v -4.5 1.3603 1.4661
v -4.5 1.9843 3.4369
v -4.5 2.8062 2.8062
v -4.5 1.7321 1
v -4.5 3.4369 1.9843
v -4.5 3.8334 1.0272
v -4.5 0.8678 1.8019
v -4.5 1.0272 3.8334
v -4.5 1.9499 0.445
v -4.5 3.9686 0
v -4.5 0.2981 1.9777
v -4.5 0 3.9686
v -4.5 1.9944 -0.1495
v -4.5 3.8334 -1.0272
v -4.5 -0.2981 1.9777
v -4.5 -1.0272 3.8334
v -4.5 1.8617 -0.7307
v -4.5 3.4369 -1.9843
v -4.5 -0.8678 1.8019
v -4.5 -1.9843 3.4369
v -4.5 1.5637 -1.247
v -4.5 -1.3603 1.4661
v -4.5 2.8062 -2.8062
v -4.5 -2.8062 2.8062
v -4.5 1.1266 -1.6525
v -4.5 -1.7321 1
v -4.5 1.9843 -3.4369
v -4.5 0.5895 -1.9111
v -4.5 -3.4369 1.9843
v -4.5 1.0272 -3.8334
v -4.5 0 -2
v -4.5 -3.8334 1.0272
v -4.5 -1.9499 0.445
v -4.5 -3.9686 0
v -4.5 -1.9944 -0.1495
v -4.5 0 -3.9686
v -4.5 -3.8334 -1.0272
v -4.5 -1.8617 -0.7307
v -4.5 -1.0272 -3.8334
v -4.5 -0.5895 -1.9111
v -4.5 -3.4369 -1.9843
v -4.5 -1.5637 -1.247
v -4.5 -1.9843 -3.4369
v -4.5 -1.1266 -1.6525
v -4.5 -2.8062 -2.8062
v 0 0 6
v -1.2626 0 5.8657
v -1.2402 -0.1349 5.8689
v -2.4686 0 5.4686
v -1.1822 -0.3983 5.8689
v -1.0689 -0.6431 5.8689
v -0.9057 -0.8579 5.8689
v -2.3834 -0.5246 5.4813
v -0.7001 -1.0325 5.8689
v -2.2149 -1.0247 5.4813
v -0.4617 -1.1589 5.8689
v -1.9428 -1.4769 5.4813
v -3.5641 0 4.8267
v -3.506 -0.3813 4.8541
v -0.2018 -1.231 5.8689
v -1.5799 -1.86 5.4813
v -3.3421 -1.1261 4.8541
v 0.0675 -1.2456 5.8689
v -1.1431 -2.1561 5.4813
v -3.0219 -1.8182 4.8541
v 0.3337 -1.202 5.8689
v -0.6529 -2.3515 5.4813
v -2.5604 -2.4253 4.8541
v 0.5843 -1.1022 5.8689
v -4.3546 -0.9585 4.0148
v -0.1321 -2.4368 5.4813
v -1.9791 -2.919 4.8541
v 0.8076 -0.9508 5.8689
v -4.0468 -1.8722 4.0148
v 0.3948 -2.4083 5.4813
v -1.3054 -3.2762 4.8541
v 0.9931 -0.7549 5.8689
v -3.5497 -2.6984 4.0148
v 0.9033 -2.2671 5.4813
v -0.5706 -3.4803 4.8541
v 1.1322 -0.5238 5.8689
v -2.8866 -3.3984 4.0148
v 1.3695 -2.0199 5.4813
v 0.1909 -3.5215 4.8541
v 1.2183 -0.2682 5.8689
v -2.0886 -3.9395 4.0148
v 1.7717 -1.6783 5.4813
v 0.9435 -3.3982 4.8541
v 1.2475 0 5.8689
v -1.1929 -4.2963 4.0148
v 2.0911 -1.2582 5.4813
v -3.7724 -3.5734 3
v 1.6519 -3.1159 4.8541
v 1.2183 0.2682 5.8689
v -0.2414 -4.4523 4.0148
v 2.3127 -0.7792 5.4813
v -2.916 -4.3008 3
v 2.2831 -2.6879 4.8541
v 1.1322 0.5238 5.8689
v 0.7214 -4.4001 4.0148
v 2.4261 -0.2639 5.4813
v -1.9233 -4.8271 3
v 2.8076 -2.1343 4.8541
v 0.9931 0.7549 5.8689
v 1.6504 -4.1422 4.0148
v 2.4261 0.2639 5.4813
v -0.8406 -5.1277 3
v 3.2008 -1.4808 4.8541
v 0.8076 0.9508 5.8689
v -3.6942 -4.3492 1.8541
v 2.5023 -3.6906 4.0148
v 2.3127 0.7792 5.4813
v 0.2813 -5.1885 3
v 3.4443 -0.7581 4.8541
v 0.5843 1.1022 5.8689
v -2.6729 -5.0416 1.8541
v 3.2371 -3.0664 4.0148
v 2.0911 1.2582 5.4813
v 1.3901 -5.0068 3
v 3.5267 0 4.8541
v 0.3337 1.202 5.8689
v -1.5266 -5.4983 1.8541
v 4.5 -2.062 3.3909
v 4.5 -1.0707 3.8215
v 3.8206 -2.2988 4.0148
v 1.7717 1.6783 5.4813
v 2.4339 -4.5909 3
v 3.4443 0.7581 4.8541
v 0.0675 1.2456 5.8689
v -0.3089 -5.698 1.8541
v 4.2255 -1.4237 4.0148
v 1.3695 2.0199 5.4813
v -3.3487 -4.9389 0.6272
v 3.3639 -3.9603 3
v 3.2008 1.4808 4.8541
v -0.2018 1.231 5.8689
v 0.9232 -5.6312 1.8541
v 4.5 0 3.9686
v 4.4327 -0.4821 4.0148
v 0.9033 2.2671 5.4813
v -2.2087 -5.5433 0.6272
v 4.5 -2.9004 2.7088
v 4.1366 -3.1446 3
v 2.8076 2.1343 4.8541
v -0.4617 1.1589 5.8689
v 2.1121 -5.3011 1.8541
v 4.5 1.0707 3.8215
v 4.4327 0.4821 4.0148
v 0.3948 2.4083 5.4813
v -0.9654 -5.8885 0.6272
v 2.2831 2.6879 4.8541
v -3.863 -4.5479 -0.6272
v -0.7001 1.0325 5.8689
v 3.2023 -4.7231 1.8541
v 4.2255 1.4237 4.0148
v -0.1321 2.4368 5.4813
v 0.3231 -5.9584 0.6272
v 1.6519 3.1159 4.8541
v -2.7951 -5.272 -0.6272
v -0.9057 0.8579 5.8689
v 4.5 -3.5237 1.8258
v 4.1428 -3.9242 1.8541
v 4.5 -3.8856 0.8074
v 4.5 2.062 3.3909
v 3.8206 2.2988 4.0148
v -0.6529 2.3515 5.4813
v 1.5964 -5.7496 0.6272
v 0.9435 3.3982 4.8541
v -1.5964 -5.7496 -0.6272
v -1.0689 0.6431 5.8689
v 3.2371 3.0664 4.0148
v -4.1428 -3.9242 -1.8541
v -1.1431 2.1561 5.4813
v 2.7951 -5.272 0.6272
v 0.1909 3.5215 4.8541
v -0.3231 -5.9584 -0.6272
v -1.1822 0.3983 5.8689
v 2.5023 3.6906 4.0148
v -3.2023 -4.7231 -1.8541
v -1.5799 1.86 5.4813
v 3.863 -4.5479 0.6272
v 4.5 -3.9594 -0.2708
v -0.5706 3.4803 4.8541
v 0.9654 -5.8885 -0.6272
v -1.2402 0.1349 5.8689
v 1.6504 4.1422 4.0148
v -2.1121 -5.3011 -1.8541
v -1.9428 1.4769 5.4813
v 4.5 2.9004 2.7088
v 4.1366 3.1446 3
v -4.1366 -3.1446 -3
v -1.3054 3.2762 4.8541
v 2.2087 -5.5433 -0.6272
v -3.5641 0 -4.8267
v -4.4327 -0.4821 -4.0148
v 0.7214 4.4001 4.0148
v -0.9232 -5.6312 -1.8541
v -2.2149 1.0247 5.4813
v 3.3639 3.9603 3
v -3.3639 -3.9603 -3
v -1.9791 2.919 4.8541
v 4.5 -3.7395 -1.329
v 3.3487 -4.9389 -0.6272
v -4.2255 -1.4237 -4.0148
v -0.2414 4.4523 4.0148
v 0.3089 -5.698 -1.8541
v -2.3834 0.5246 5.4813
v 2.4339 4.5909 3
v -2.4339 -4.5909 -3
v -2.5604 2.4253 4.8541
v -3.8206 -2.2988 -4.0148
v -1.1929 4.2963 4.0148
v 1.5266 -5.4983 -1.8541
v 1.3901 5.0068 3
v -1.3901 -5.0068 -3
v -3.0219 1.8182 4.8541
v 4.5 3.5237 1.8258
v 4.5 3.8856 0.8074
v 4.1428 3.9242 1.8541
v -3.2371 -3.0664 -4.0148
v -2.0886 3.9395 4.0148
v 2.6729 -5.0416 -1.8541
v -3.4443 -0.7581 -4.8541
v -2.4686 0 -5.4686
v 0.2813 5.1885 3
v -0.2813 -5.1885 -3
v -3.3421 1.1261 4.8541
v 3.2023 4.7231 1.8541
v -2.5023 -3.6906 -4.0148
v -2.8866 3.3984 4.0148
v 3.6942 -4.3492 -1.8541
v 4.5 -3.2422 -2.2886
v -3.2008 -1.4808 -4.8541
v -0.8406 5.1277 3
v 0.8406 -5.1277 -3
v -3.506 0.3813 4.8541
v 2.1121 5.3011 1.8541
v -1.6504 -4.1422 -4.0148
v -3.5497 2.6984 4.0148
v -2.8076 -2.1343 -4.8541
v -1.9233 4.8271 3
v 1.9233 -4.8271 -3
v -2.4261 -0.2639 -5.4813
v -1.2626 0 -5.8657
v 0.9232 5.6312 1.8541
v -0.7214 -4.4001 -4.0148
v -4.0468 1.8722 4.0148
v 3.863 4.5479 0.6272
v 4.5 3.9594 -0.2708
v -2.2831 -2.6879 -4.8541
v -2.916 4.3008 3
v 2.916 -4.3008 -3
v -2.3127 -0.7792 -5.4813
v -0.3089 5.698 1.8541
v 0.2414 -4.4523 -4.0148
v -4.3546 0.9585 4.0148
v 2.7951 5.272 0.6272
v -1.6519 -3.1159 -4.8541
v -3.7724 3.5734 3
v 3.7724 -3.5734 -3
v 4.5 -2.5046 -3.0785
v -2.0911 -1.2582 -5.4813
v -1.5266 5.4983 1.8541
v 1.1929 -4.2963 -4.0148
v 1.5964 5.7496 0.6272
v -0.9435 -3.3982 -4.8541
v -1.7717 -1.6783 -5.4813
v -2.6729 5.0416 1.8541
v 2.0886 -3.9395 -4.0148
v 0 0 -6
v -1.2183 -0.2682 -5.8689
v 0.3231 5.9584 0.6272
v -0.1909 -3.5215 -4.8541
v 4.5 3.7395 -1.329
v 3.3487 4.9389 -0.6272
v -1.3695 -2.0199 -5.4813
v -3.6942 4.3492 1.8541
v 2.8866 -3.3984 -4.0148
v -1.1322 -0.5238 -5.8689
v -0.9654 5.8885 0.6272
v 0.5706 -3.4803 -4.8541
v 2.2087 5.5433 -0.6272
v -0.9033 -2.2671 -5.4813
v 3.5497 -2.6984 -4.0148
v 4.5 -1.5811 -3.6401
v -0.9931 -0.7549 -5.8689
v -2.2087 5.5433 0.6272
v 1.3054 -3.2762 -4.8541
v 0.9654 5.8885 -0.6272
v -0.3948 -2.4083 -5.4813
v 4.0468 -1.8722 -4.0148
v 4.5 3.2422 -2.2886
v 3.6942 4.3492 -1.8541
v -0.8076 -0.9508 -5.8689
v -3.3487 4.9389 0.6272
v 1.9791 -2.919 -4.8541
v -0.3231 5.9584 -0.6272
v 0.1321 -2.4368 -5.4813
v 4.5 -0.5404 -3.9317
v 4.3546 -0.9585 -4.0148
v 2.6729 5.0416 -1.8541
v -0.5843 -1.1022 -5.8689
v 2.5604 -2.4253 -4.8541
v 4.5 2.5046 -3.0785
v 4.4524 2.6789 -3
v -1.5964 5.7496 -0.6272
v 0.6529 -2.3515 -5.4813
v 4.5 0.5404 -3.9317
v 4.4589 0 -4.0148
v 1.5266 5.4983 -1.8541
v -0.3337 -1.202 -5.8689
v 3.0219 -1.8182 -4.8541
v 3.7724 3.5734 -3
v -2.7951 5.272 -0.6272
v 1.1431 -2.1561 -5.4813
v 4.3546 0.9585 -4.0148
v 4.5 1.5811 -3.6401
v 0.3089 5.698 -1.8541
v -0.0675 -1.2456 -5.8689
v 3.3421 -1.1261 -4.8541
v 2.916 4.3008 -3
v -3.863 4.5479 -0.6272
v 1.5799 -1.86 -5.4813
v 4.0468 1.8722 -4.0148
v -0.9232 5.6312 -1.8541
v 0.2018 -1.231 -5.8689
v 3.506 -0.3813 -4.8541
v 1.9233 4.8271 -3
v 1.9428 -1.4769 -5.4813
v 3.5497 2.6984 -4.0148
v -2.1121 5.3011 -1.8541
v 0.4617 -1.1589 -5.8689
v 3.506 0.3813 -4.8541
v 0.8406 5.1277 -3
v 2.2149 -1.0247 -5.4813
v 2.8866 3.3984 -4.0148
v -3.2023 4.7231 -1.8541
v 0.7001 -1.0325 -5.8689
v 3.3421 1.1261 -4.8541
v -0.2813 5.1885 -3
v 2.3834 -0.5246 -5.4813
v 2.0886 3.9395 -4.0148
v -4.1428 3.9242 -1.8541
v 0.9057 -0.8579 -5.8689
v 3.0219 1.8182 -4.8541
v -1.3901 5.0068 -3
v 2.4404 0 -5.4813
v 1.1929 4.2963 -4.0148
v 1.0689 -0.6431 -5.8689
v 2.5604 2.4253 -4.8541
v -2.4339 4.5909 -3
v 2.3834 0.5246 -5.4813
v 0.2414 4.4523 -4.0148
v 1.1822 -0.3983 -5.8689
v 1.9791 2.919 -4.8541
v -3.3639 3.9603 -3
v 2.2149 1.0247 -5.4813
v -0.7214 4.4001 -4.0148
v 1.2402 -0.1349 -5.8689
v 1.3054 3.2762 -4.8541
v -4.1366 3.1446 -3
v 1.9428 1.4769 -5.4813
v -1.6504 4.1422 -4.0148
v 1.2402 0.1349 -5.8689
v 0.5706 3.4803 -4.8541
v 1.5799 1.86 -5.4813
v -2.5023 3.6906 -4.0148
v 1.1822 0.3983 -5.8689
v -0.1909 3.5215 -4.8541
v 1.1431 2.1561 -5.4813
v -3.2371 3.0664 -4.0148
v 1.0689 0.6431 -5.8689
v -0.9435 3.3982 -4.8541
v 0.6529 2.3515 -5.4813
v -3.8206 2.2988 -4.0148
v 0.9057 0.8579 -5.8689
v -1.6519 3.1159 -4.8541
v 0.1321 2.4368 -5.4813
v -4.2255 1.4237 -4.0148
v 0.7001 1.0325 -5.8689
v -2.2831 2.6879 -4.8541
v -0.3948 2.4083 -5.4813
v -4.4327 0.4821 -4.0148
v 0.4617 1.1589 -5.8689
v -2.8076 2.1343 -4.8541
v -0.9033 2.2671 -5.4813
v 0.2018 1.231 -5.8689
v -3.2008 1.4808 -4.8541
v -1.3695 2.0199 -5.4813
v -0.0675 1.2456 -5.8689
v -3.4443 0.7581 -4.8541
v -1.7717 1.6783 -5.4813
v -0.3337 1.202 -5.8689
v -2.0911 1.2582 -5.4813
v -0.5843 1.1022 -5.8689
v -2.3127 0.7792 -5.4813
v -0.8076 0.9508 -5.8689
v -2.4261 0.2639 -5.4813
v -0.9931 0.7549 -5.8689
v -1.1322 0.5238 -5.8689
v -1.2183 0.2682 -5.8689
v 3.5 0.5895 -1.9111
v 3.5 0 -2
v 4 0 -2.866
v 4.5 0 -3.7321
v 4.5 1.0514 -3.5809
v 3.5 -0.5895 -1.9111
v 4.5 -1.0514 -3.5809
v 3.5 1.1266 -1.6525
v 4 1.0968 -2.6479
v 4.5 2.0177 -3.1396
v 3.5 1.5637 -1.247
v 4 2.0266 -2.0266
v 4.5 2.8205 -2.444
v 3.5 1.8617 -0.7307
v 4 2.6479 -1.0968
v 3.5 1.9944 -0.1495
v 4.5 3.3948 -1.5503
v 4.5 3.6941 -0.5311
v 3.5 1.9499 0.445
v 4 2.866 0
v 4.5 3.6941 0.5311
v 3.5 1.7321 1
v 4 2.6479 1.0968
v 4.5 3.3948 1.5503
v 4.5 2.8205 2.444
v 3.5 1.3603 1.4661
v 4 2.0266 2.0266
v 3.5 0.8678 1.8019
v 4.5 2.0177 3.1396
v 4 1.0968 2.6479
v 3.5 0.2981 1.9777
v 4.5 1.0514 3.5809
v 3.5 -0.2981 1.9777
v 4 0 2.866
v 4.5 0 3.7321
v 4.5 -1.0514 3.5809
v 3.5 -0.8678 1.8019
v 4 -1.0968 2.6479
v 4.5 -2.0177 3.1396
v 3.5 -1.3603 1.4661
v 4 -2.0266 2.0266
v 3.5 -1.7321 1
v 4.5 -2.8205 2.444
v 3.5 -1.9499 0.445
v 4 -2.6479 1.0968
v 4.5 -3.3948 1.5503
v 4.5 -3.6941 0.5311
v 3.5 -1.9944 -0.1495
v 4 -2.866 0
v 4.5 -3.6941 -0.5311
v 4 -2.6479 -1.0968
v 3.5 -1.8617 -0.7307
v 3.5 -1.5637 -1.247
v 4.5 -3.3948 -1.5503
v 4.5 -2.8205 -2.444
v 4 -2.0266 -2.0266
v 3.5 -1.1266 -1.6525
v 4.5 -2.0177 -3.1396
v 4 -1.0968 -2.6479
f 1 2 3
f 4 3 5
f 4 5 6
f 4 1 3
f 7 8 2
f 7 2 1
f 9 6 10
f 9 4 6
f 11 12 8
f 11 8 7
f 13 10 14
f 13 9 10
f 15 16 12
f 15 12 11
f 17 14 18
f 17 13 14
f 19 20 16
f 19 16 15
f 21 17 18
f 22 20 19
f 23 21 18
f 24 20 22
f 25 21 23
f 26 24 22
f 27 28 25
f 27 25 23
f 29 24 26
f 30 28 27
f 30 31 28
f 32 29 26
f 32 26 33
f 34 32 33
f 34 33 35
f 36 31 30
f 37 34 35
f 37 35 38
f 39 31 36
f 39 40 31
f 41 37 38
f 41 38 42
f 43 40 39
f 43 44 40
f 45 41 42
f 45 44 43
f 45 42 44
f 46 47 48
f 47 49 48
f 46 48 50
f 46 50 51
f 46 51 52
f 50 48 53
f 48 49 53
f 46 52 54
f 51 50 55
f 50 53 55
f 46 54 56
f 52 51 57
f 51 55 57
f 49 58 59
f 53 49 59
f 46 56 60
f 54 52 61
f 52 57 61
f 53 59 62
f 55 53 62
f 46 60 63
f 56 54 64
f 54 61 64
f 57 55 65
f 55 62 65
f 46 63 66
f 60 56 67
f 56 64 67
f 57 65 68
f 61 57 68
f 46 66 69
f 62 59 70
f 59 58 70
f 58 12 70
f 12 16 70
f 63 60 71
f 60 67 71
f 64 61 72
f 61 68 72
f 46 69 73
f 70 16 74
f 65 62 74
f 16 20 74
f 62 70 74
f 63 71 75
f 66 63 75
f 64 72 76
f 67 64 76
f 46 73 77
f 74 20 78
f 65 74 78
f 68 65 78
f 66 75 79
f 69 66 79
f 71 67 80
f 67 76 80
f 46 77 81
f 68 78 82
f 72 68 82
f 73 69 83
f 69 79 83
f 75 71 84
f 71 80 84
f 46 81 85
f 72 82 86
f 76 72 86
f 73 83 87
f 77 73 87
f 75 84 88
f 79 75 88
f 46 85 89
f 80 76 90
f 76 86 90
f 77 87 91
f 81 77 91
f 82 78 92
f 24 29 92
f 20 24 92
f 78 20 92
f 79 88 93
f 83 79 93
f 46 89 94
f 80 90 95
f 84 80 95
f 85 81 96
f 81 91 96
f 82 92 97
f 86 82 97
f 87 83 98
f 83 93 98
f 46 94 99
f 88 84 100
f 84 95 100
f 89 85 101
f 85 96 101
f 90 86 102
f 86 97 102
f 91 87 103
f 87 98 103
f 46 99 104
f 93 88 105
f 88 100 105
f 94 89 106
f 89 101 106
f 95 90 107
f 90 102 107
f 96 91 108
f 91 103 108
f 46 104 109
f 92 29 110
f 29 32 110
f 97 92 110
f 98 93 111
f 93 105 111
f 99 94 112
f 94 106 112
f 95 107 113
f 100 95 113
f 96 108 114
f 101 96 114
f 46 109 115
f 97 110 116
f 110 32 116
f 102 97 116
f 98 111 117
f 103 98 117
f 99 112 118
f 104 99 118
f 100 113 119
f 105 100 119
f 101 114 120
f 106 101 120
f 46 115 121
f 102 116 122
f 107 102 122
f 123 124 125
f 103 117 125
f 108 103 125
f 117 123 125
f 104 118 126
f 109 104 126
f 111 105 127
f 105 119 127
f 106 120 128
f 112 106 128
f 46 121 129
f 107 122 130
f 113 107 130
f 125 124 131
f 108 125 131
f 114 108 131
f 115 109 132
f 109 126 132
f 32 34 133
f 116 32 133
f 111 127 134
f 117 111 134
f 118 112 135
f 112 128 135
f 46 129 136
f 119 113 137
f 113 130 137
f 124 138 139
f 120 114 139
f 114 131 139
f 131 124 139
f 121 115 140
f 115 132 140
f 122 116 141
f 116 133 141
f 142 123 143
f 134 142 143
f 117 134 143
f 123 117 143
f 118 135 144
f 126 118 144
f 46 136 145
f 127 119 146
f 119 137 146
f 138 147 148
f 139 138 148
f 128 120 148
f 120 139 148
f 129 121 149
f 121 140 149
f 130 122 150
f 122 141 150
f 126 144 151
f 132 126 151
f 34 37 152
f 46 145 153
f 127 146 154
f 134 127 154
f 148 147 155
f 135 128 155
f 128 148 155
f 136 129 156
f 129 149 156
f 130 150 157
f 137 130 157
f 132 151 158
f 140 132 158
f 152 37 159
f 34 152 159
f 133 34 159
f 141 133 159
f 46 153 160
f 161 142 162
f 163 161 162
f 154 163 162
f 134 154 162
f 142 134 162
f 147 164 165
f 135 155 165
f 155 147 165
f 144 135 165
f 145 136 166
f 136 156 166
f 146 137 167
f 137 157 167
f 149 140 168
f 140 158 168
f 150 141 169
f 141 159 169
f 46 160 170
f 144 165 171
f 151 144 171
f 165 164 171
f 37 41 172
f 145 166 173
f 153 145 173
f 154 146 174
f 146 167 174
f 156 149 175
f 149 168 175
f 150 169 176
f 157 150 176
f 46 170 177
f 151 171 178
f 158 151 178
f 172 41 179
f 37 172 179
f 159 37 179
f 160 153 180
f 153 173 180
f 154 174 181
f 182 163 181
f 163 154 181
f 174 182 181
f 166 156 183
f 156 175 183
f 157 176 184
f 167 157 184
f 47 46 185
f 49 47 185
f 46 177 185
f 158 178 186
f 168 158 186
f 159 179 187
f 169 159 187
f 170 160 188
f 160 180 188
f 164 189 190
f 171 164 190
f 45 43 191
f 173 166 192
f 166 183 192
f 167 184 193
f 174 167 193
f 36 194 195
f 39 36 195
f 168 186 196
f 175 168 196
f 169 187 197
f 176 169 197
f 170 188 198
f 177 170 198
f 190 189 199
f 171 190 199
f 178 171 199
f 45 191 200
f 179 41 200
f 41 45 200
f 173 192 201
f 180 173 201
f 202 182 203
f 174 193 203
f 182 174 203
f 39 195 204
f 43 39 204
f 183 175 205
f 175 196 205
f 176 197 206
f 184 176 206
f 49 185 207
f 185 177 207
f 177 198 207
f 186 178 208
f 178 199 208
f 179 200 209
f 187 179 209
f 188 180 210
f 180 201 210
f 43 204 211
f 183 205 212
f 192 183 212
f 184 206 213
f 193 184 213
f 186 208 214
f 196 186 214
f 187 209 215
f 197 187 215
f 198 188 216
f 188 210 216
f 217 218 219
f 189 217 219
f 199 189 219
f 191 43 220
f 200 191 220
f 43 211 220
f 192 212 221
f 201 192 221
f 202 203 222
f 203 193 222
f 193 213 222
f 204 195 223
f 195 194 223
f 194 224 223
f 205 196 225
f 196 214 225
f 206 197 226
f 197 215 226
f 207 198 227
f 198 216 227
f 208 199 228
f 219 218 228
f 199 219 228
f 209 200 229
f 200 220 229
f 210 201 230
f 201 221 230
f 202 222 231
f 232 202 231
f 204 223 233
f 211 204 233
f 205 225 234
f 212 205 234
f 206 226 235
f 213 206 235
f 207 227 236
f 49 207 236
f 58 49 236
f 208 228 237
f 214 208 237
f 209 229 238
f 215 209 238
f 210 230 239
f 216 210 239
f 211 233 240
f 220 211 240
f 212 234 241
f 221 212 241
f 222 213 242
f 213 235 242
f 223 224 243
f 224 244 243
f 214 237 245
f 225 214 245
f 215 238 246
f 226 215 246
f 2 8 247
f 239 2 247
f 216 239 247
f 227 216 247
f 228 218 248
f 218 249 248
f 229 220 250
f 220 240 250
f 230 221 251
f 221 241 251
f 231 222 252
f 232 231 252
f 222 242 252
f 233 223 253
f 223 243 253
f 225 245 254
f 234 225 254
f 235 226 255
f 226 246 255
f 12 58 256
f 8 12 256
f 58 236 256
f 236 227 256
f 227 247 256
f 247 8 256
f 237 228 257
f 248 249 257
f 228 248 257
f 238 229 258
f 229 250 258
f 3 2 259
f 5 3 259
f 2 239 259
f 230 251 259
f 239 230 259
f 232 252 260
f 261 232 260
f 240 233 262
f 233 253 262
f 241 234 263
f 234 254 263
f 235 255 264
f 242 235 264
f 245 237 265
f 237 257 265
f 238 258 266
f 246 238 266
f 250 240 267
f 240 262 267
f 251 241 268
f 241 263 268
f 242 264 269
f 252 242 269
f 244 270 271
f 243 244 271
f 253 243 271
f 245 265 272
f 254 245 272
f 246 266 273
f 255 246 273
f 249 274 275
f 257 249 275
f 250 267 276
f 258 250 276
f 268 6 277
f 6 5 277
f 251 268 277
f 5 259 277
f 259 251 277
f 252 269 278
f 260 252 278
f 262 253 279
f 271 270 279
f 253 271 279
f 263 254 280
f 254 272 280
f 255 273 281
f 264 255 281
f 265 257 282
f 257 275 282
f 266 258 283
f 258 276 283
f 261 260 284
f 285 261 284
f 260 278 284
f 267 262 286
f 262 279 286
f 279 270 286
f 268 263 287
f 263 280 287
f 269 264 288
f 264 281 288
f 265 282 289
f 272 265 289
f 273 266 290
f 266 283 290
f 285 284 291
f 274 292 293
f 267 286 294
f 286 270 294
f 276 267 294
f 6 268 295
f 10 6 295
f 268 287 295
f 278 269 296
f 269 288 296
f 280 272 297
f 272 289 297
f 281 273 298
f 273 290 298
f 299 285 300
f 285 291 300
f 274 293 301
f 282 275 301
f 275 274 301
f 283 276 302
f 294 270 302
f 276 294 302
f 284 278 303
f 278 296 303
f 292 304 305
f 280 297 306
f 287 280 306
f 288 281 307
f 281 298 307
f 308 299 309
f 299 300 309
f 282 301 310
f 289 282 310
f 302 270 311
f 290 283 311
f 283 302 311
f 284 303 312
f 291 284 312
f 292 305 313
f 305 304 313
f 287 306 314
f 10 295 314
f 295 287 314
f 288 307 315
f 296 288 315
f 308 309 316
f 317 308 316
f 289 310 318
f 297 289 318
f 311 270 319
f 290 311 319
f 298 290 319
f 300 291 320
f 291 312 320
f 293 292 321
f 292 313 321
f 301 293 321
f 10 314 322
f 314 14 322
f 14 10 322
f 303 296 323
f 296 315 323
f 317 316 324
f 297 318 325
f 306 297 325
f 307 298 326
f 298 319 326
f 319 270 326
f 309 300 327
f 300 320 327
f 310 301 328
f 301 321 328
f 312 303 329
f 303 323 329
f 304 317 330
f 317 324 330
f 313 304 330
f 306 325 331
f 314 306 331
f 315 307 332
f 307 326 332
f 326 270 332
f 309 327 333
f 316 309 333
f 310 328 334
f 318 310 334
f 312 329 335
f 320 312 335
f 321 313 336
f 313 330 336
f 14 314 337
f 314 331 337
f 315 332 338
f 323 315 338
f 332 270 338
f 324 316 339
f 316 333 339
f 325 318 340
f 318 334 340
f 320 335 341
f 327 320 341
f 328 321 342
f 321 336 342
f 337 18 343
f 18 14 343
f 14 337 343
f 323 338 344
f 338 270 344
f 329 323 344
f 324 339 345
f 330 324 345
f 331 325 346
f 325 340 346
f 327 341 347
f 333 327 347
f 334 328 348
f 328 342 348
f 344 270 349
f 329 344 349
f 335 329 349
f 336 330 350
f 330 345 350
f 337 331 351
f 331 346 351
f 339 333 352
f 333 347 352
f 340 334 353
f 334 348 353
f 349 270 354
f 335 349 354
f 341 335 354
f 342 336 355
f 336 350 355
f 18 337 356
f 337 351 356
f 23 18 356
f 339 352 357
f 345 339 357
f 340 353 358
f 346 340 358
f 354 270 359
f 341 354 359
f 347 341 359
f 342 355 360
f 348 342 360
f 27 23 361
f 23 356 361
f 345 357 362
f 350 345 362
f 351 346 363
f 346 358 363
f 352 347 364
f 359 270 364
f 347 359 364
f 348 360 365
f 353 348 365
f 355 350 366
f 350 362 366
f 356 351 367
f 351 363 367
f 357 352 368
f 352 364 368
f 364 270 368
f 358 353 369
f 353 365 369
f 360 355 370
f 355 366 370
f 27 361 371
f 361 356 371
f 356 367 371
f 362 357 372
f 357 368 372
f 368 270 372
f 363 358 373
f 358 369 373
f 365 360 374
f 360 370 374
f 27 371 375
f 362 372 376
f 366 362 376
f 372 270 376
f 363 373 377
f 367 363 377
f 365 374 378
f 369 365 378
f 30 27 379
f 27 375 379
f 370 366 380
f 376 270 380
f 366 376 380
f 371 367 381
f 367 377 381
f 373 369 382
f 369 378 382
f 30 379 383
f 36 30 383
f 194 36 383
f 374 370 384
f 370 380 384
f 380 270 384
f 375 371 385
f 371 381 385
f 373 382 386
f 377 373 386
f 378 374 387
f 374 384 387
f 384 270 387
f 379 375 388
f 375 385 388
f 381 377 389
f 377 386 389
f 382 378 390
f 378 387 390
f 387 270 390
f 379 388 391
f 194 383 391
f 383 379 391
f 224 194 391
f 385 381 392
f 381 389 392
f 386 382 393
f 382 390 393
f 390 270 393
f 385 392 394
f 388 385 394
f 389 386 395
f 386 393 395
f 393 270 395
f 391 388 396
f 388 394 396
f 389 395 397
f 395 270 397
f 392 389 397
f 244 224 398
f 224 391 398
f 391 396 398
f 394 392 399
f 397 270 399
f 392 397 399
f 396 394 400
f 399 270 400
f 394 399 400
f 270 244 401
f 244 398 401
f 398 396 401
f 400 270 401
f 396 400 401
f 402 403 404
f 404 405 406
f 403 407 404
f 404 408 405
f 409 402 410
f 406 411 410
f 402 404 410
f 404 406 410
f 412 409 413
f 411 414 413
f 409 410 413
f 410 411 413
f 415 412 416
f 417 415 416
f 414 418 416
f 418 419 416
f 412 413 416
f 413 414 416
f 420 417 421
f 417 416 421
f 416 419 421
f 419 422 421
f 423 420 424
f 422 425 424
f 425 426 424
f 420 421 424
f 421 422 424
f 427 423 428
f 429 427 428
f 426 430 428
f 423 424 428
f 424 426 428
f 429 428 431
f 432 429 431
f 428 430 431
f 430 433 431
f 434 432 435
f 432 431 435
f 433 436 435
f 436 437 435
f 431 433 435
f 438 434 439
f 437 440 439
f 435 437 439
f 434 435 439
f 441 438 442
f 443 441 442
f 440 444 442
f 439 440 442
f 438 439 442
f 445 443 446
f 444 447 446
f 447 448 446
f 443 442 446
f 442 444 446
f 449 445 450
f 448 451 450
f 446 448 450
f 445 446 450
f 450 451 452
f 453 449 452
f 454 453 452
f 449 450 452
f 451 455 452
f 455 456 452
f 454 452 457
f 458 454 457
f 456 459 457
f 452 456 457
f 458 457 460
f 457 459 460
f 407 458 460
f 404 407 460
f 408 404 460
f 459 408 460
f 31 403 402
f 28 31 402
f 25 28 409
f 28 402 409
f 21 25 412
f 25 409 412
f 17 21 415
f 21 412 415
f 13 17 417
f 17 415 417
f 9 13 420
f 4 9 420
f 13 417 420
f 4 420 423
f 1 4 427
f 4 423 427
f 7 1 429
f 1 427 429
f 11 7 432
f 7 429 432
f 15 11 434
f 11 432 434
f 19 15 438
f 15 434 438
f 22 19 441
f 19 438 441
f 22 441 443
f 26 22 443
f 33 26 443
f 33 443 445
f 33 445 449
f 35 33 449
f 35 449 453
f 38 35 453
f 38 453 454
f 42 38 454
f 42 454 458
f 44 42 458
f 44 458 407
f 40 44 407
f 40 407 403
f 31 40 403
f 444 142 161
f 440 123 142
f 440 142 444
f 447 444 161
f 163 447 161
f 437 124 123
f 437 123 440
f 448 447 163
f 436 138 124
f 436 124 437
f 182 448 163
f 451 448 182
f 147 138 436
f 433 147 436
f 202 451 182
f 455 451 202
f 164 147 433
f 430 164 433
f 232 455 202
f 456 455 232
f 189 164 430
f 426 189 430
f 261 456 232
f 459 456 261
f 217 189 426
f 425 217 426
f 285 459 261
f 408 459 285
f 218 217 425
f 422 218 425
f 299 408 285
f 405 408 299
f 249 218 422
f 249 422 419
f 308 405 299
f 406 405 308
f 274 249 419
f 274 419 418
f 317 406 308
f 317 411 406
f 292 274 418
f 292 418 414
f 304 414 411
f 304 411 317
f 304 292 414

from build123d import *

# Parameters (mm, degrees)
CUT_EXTRUDE1_DEPTH = 10
CUT_EXTRUDE2_REACH = 11
SKETCH4_R          = 2
CHAMFER1_SIZE      = 1
CHAMFER1_SIZE2     = 1.732050808


with BuildPart() as part:
    # Sketch2 → Revolve10 (revolve)
    with BuildSketch(Plane(origin=(0, 0, 0), x_dir=(1, 0, 0), z_dir=(0, 1, 0))):
        with BuildLine():
            Line((0, 6), (0, -6))
            ThreePointArc((0, -6), (-6, 0), (0, 6))
        make_face()
    revolve(axis=Axis((0, 0, -6), (0, 0, 1)))

    # Sketch3 → Cut-Extrude1 (cut, symmetric)
    with BuildSketch(Plane(origin=(0, 0, 0), x_dir=(1, 0, 0), z_dir=(0, 1, 0))):
        Polygon((-4.5, 6.116617365), (-8.039926199, -0.619090826), (-4.5, -6.116617365), align=None)
        Polygon((4.5, -6.116617365), (4.5, 6.116617365), (7.115417232, -1.229927109), align=None)
    extrude(amount=CUT_EXTRUDE1_DEPTH, both=True, mode=Mode.SUBTRACT)

    # Sketch4 → Cut-Extrude2 (cut, up to next)
    with BuildSketch(Plane(origin=(4.5, 0, 0), x_dir=(0, 0, -1), z_dir=(1, 0, 0)), mode=Mode.PRIVATE) as cut_extrude2_sk1:
        Circle(SKETCH4_R)
    cut_extrude2_tool1 = extrude(cut_extrude2_sk1.sketch, amount=-CUT_EXTRUDE2_REACH, mode=Mode.PRIVATE) & part.part
    add(cut_extrude2_tool1.solids().sort_by_distance((4.5, 0, 0))[0], mode=Mode.SUBTRACT)

    # Chamfer1
    chamfer1_edges = [part.edges().sort_by_distance(p)[0] for p in [
        (4.5, 0, 2),
    ]]
    chamfer1_side = [part.faces().sort_by_distance(p)[0] for p in [
        (0, 0, 2),
    ]]
    chamfer(chamfer1_edges, length=CHAMFER1_SIZE, length2=CHAMFER1_SIZE2, reference=chamfer1_side[0])


solid = part.part
